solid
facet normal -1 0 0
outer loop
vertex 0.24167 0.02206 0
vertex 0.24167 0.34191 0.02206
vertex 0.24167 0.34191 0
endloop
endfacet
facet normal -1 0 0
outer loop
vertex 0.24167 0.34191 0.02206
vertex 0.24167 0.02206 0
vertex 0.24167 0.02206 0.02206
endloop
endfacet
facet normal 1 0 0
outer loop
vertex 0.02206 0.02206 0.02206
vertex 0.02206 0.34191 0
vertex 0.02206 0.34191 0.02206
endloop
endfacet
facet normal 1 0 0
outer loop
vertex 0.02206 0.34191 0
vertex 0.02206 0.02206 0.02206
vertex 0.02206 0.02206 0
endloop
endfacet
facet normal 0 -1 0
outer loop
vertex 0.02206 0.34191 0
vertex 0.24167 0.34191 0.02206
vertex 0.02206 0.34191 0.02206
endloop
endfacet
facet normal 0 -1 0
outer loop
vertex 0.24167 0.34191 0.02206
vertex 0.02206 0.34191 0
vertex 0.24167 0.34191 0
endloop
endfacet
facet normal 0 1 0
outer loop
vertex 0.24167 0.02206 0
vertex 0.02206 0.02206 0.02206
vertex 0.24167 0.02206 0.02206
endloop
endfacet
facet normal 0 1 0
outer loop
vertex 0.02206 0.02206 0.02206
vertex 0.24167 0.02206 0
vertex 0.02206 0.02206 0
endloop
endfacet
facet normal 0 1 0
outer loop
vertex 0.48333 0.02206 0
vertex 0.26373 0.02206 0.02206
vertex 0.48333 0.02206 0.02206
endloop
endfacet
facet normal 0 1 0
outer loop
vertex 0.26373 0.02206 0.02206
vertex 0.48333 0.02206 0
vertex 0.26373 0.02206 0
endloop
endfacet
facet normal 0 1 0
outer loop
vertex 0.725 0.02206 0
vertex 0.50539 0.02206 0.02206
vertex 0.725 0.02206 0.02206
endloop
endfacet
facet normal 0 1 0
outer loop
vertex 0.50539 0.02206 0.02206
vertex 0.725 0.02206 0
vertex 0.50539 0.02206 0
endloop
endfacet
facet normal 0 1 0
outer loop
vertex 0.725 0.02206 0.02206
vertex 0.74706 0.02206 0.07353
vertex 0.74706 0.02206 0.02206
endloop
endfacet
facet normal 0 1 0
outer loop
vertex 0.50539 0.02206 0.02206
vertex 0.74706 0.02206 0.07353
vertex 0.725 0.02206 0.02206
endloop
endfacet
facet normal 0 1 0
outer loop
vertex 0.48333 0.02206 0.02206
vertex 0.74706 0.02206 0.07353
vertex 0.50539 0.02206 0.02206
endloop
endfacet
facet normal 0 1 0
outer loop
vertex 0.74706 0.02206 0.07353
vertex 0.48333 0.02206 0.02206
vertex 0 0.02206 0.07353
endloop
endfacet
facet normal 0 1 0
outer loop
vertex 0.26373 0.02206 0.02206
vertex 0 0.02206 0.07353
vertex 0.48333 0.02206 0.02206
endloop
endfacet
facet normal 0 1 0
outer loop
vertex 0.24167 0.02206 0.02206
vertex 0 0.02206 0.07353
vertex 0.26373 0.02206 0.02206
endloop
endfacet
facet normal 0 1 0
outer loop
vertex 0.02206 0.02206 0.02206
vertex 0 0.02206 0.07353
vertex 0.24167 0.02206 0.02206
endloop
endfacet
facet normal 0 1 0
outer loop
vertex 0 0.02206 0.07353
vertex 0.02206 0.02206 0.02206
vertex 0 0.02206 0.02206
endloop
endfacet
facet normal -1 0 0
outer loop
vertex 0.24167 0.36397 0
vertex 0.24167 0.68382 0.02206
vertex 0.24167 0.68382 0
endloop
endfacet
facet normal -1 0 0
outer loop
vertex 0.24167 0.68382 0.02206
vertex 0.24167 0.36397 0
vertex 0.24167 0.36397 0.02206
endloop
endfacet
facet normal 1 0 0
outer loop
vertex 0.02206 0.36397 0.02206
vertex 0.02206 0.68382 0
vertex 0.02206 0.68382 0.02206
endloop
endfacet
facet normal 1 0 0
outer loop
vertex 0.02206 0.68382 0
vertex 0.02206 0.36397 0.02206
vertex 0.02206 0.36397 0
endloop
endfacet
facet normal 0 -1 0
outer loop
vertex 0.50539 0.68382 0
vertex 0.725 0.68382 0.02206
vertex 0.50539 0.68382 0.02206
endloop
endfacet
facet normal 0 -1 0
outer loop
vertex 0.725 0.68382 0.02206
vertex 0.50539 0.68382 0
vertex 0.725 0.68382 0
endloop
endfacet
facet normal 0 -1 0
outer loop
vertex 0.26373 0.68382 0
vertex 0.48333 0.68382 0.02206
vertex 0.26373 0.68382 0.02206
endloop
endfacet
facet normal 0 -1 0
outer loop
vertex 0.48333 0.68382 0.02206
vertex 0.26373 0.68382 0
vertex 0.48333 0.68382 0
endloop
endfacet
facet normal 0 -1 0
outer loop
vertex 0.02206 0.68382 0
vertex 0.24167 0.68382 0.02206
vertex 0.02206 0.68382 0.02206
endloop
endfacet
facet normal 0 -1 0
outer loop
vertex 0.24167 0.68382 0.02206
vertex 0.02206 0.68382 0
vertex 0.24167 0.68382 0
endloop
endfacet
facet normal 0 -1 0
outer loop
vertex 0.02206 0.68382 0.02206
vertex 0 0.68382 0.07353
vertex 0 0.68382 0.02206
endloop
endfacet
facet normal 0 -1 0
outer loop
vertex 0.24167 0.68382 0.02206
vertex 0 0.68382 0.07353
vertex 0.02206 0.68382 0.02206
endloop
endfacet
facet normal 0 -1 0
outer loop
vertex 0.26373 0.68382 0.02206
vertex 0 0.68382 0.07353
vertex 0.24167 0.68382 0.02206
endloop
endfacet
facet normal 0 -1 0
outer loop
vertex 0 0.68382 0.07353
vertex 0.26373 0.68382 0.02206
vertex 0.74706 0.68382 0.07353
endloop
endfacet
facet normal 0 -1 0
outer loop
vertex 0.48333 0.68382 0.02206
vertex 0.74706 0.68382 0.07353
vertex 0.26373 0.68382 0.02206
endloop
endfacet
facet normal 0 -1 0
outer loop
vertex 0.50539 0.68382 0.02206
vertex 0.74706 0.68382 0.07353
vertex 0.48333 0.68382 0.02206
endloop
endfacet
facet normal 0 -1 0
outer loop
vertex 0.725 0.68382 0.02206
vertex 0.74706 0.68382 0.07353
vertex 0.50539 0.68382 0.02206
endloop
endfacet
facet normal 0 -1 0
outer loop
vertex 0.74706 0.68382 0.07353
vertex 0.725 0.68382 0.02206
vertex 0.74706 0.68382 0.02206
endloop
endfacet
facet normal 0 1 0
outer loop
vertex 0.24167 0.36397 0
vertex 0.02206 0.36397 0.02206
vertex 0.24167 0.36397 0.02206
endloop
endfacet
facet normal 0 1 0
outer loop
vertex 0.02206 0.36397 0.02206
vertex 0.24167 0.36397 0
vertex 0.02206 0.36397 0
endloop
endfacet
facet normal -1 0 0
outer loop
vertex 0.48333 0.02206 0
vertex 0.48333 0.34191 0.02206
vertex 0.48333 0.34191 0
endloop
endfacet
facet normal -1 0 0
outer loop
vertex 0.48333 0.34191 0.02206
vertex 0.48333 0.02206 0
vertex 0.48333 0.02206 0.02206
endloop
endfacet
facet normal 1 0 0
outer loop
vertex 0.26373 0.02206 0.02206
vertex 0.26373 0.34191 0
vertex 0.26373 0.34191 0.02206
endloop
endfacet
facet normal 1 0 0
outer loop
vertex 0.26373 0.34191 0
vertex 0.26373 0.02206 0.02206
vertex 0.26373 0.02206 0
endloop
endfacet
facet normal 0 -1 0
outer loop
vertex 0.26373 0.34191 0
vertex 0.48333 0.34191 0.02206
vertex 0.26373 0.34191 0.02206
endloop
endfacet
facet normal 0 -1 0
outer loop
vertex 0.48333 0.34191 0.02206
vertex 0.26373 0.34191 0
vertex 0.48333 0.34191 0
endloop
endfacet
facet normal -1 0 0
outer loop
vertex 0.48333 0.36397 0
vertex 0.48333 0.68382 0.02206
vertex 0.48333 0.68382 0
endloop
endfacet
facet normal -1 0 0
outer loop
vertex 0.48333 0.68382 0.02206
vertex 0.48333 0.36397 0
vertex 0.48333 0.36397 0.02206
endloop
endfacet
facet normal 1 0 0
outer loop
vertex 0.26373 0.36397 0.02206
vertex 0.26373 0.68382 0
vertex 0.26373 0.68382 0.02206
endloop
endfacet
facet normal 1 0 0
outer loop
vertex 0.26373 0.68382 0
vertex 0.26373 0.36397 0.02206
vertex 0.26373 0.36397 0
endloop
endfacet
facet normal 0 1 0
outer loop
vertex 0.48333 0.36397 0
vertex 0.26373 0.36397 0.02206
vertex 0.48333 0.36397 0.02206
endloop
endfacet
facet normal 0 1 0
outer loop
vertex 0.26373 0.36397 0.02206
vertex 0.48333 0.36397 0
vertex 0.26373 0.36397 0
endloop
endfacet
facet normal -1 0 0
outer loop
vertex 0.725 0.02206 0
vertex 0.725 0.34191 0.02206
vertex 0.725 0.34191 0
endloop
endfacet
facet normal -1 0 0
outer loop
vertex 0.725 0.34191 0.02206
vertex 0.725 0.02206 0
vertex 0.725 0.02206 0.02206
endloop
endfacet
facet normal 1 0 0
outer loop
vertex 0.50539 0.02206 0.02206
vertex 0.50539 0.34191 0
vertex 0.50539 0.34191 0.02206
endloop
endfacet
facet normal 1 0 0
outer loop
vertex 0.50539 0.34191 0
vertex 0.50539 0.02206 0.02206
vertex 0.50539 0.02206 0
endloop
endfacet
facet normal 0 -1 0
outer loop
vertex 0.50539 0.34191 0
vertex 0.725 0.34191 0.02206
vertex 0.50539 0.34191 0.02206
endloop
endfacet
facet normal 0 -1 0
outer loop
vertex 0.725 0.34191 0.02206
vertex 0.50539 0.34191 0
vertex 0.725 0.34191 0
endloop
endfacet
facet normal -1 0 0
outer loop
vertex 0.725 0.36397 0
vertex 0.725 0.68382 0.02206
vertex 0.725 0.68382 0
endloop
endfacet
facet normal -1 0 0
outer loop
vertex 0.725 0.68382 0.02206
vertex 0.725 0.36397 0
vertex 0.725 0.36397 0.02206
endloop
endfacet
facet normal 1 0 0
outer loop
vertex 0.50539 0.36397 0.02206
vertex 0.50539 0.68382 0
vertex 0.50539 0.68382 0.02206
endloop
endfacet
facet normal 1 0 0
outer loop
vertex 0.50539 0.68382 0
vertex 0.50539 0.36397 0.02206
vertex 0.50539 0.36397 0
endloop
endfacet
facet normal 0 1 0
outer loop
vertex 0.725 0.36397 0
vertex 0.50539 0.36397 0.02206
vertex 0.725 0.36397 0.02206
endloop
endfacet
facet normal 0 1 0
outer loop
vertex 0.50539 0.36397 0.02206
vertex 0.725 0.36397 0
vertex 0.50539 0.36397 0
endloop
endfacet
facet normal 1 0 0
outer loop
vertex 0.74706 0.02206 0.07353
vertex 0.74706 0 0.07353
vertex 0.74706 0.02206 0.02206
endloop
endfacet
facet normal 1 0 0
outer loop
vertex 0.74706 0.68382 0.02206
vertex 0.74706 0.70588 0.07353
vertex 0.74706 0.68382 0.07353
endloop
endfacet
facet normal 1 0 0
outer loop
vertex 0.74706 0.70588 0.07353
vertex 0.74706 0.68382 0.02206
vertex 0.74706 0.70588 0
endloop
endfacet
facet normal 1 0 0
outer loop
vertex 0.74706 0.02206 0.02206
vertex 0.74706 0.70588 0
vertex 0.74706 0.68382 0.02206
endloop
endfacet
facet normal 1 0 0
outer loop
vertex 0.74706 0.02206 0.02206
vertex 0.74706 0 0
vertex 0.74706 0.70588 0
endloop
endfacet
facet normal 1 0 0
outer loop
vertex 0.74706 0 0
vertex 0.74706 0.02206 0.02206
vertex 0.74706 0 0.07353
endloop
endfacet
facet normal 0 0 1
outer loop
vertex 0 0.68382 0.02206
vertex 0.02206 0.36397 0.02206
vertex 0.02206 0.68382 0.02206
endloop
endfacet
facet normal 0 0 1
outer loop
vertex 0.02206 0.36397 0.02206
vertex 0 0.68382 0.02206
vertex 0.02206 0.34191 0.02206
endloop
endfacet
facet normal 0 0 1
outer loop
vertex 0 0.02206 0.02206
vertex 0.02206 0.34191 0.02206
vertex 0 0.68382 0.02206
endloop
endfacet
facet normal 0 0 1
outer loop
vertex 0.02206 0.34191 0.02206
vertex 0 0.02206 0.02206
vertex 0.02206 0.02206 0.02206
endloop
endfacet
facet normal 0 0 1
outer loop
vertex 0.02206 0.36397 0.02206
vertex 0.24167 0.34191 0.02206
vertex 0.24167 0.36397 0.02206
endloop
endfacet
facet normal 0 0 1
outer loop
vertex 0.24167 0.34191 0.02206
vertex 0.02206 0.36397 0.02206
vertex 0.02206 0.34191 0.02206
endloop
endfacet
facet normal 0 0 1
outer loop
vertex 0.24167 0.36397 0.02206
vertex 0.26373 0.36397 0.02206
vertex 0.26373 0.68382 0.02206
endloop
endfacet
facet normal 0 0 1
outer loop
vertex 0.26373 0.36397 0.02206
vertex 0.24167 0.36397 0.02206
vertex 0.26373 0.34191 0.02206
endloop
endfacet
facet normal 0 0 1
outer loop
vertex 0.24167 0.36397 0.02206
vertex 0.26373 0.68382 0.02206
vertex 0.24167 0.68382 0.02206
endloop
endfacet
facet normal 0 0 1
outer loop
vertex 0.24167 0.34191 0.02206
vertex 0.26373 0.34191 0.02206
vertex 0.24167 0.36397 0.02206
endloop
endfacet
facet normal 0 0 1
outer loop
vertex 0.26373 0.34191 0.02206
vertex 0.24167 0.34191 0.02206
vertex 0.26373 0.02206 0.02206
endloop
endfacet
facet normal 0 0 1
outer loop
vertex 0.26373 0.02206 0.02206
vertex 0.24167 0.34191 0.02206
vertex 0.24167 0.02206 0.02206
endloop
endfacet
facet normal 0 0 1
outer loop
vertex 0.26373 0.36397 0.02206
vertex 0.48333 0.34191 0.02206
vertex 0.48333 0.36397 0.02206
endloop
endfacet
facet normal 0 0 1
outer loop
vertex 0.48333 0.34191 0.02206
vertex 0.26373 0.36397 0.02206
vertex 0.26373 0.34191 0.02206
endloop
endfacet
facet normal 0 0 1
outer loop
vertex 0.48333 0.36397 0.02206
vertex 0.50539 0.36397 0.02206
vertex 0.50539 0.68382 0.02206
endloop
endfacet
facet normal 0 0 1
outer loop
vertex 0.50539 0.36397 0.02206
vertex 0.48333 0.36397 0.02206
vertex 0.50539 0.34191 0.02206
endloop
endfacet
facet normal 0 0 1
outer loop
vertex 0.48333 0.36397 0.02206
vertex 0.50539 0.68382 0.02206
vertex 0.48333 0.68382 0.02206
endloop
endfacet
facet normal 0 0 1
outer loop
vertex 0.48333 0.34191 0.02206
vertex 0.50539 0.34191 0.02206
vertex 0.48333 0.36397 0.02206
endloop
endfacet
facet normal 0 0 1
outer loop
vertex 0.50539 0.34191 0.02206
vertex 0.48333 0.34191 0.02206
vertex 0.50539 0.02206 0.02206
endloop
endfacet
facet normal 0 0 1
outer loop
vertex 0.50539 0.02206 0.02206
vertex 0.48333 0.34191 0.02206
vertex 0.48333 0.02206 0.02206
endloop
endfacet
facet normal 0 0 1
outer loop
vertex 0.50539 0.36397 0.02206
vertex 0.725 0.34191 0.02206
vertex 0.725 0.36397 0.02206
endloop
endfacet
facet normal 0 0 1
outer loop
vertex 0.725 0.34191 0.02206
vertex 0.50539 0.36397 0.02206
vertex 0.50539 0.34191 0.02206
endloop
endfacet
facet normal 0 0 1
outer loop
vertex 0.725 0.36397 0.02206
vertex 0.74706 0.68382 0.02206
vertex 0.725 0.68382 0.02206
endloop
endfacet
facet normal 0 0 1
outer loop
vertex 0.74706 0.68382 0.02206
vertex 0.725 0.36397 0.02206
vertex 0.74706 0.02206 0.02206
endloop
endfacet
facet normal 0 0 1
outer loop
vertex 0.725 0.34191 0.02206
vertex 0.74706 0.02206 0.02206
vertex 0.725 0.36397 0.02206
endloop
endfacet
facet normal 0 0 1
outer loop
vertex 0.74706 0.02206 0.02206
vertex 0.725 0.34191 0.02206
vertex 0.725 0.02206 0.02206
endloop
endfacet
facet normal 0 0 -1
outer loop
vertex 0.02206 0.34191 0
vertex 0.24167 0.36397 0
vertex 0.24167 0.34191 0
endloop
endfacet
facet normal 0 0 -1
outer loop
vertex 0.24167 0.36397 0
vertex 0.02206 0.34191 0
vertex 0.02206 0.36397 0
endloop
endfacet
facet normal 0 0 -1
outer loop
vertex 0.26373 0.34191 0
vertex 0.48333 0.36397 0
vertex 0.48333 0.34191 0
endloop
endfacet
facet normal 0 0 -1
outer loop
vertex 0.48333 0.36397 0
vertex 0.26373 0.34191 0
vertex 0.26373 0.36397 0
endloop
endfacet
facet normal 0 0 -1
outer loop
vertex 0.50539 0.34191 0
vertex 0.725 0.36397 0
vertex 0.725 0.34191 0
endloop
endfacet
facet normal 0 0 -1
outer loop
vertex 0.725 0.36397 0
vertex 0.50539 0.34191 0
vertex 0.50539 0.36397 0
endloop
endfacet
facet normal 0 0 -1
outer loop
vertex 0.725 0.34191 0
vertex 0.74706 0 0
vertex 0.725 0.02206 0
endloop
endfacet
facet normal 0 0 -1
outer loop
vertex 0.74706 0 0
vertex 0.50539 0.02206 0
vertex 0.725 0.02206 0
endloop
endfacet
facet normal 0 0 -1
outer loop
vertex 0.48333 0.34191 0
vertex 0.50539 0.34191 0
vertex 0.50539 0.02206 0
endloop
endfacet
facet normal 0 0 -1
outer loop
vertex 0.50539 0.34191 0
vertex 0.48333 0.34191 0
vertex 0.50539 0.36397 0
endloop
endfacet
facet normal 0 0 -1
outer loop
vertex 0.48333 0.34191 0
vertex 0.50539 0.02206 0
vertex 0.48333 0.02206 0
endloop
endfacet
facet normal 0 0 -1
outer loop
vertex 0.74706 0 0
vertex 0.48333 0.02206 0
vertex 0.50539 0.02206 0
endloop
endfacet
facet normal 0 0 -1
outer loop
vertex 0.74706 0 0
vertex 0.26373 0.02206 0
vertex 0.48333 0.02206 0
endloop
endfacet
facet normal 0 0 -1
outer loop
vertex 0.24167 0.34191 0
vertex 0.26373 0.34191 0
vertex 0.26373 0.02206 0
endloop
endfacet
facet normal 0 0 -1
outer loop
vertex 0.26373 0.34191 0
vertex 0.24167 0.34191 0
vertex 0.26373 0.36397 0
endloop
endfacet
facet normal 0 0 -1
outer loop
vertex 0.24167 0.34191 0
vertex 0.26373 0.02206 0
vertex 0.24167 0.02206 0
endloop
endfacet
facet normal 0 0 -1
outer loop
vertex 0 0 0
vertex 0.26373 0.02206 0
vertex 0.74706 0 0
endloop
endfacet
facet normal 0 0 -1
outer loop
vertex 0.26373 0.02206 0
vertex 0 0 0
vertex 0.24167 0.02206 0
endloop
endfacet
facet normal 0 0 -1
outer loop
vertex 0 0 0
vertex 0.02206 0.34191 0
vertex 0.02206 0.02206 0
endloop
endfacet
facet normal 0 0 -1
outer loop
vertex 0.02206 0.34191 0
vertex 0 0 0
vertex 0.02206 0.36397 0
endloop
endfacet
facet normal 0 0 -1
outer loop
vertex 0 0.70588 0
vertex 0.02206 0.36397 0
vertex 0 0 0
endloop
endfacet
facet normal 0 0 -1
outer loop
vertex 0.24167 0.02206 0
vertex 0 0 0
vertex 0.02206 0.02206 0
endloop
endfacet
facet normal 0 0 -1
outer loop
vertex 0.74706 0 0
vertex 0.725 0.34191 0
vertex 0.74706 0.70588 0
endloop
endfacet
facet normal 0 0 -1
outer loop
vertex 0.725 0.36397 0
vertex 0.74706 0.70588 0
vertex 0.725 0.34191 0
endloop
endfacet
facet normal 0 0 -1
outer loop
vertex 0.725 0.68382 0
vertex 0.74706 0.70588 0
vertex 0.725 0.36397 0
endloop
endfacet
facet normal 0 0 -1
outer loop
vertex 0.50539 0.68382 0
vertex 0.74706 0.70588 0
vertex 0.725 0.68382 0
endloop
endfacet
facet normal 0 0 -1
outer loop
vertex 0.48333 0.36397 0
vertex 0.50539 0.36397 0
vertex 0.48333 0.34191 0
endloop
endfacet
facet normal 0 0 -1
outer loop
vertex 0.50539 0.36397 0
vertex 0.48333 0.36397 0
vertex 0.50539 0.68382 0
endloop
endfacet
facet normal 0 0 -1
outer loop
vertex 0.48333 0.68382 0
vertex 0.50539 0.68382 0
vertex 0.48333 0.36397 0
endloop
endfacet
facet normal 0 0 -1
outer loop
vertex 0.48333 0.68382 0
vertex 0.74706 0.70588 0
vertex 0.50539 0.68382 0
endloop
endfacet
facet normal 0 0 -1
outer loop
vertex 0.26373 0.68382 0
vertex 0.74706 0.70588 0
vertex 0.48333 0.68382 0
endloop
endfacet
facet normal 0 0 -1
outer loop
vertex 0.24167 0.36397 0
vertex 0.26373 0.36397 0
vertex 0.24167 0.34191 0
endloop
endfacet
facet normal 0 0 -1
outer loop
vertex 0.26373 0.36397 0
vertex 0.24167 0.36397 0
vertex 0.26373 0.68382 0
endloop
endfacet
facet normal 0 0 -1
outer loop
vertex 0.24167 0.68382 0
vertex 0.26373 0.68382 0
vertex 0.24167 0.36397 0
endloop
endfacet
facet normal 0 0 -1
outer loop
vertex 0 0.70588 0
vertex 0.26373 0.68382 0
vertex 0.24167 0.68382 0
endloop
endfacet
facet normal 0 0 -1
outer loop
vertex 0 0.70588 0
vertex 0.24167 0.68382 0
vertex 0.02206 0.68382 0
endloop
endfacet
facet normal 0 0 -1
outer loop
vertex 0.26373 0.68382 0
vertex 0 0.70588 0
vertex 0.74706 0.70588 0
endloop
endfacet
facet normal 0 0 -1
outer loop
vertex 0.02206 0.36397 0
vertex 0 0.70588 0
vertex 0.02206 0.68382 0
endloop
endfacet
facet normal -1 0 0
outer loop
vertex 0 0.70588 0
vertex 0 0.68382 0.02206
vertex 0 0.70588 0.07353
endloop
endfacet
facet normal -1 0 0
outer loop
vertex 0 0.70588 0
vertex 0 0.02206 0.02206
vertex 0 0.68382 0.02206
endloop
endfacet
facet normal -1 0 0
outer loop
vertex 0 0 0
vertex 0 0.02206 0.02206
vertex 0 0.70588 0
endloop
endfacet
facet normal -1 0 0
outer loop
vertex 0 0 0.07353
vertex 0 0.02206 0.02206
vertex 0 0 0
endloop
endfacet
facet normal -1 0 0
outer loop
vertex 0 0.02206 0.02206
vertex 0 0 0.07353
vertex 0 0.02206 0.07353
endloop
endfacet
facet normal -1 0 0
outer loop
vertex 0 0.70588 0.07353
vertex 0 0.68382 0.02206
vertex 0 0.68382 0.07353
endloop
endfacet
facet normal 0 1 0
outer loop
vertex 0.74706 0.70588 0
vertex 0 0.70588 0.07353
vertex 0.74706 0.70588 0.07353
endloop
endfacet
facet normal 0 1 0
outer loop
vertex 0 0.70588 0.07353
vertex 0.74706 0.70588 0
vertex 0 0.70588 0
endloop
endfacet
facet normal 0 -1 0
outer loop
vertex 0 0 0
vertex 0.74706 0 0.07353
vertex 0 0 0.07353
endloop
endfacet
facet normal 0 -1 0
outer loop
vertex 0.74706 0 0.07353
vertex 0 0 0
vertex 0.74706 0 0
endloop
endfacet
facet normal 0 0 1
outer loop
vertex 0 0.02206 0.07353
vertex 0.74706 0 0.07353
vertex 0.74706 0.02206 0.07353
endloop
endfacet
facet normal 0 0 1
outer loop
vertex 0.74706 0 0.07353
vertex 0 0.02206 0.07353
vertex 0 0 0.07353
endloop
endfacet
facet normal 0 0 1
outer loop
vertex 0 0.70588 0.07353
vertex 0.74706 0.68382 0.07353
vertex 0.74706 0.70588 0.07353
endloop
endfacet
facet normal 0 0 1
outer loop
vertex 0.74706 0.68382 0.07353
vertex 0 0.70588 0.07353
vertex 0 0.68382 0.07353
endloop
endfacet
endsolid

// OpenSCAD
// === Parameters ===

// Base web dimensions
base_length = 0.747059;   // X extent
base_width  = 0.705882;   // Y extent
base_height = 0.022059;   // Z extent (web plate thickness)

// Side wall dimensions
wall_thick  = 0.022059;   // Wall / rib thickness (Y direction)
wall_height = 0.073529;   // Total wall height from Z = 0

// Circular through-hole parameters
hole_r    = 0.0294;       // Hole radius
hole1_x   = 0.1802;       // Hole 1 center X
hole1_y   = 0.5897;       // Hole 1 center Y
hole2_x   = 0.5537;       // Hole 2 center X
hole2_y   = 0.5897;       // Hole 2 center Y

// Web grid layout: 3 columns x 2 rows = 6 inner voids
num_cols  = 3;
num_rows  = 2;
rib_w     = wall_thick;   // Internal rib width matches wall thickness

// Resolution for curved surfaces
$fn = 100;

// === Derived dimensions ===
// Void pocket sizes (uniform grid within outer rib frame)
void_x = (base_length - (num_cols + 1) * rib_w) / num_cols;
void_y = (base_width  - (num_rows + 1) * rib_w) / num_rows;

// Small epsilon for clean boolean cuts
eps = 0.001;

// === Helper Modules ===

// Open web plate: outer frame + internal ribs with 6 rectangular voids
module base_web() {
    difference() {
        // Solid rectangular slab
        cube([base_length, base_width, base_height]);

        // Subtract 6 rectangular through-voids (3 cols x 2 rows)
        for (c = [0 : num_cols - 1]) {
            for (r = [0 : num_rows - 1]) {
                translate([
                    rib_w + c * (void_x + rib_w),
                    rib_w + r * (void_y + rib_w),
                    -eps
                ])
                cube([void_x, void_y, base_height + 2 * eps]);
            }
        }
    }
}

// Full-length rectangular wall along X direction
module side_wall(y_offset) {
    translate([0, y_offset, 0])
        cube([base_length, wall_thick, wall_height]);
}

// Circular through-hole at given XY position, through base thickness
module mounting_hole(cx, cy) {
    translate([cx, cy, -eps])
        cylinder(h = base_height + 2 * eps, r = hole_r);
}

// === Main Assembly ===
difference() {
    union() {
        // Step 1: Base web with outer boundary, internal ribs, and 6 voids
        base_web();

        // Step 2: Front side wall (at Y = 0, rises to full wall_height)
        side_wall(0);

        // Step 3: Back side wall (at Y = base_width - wall_thick, rises to full wall_height)
        side_wall(base_width - wall_thick);
    }

    // Step 4: Two circular through-openings on the base plane
    mounting_hole(hole1_x, hole1_y);
    mounting_hole(hole2_x, hole2_y);
}
